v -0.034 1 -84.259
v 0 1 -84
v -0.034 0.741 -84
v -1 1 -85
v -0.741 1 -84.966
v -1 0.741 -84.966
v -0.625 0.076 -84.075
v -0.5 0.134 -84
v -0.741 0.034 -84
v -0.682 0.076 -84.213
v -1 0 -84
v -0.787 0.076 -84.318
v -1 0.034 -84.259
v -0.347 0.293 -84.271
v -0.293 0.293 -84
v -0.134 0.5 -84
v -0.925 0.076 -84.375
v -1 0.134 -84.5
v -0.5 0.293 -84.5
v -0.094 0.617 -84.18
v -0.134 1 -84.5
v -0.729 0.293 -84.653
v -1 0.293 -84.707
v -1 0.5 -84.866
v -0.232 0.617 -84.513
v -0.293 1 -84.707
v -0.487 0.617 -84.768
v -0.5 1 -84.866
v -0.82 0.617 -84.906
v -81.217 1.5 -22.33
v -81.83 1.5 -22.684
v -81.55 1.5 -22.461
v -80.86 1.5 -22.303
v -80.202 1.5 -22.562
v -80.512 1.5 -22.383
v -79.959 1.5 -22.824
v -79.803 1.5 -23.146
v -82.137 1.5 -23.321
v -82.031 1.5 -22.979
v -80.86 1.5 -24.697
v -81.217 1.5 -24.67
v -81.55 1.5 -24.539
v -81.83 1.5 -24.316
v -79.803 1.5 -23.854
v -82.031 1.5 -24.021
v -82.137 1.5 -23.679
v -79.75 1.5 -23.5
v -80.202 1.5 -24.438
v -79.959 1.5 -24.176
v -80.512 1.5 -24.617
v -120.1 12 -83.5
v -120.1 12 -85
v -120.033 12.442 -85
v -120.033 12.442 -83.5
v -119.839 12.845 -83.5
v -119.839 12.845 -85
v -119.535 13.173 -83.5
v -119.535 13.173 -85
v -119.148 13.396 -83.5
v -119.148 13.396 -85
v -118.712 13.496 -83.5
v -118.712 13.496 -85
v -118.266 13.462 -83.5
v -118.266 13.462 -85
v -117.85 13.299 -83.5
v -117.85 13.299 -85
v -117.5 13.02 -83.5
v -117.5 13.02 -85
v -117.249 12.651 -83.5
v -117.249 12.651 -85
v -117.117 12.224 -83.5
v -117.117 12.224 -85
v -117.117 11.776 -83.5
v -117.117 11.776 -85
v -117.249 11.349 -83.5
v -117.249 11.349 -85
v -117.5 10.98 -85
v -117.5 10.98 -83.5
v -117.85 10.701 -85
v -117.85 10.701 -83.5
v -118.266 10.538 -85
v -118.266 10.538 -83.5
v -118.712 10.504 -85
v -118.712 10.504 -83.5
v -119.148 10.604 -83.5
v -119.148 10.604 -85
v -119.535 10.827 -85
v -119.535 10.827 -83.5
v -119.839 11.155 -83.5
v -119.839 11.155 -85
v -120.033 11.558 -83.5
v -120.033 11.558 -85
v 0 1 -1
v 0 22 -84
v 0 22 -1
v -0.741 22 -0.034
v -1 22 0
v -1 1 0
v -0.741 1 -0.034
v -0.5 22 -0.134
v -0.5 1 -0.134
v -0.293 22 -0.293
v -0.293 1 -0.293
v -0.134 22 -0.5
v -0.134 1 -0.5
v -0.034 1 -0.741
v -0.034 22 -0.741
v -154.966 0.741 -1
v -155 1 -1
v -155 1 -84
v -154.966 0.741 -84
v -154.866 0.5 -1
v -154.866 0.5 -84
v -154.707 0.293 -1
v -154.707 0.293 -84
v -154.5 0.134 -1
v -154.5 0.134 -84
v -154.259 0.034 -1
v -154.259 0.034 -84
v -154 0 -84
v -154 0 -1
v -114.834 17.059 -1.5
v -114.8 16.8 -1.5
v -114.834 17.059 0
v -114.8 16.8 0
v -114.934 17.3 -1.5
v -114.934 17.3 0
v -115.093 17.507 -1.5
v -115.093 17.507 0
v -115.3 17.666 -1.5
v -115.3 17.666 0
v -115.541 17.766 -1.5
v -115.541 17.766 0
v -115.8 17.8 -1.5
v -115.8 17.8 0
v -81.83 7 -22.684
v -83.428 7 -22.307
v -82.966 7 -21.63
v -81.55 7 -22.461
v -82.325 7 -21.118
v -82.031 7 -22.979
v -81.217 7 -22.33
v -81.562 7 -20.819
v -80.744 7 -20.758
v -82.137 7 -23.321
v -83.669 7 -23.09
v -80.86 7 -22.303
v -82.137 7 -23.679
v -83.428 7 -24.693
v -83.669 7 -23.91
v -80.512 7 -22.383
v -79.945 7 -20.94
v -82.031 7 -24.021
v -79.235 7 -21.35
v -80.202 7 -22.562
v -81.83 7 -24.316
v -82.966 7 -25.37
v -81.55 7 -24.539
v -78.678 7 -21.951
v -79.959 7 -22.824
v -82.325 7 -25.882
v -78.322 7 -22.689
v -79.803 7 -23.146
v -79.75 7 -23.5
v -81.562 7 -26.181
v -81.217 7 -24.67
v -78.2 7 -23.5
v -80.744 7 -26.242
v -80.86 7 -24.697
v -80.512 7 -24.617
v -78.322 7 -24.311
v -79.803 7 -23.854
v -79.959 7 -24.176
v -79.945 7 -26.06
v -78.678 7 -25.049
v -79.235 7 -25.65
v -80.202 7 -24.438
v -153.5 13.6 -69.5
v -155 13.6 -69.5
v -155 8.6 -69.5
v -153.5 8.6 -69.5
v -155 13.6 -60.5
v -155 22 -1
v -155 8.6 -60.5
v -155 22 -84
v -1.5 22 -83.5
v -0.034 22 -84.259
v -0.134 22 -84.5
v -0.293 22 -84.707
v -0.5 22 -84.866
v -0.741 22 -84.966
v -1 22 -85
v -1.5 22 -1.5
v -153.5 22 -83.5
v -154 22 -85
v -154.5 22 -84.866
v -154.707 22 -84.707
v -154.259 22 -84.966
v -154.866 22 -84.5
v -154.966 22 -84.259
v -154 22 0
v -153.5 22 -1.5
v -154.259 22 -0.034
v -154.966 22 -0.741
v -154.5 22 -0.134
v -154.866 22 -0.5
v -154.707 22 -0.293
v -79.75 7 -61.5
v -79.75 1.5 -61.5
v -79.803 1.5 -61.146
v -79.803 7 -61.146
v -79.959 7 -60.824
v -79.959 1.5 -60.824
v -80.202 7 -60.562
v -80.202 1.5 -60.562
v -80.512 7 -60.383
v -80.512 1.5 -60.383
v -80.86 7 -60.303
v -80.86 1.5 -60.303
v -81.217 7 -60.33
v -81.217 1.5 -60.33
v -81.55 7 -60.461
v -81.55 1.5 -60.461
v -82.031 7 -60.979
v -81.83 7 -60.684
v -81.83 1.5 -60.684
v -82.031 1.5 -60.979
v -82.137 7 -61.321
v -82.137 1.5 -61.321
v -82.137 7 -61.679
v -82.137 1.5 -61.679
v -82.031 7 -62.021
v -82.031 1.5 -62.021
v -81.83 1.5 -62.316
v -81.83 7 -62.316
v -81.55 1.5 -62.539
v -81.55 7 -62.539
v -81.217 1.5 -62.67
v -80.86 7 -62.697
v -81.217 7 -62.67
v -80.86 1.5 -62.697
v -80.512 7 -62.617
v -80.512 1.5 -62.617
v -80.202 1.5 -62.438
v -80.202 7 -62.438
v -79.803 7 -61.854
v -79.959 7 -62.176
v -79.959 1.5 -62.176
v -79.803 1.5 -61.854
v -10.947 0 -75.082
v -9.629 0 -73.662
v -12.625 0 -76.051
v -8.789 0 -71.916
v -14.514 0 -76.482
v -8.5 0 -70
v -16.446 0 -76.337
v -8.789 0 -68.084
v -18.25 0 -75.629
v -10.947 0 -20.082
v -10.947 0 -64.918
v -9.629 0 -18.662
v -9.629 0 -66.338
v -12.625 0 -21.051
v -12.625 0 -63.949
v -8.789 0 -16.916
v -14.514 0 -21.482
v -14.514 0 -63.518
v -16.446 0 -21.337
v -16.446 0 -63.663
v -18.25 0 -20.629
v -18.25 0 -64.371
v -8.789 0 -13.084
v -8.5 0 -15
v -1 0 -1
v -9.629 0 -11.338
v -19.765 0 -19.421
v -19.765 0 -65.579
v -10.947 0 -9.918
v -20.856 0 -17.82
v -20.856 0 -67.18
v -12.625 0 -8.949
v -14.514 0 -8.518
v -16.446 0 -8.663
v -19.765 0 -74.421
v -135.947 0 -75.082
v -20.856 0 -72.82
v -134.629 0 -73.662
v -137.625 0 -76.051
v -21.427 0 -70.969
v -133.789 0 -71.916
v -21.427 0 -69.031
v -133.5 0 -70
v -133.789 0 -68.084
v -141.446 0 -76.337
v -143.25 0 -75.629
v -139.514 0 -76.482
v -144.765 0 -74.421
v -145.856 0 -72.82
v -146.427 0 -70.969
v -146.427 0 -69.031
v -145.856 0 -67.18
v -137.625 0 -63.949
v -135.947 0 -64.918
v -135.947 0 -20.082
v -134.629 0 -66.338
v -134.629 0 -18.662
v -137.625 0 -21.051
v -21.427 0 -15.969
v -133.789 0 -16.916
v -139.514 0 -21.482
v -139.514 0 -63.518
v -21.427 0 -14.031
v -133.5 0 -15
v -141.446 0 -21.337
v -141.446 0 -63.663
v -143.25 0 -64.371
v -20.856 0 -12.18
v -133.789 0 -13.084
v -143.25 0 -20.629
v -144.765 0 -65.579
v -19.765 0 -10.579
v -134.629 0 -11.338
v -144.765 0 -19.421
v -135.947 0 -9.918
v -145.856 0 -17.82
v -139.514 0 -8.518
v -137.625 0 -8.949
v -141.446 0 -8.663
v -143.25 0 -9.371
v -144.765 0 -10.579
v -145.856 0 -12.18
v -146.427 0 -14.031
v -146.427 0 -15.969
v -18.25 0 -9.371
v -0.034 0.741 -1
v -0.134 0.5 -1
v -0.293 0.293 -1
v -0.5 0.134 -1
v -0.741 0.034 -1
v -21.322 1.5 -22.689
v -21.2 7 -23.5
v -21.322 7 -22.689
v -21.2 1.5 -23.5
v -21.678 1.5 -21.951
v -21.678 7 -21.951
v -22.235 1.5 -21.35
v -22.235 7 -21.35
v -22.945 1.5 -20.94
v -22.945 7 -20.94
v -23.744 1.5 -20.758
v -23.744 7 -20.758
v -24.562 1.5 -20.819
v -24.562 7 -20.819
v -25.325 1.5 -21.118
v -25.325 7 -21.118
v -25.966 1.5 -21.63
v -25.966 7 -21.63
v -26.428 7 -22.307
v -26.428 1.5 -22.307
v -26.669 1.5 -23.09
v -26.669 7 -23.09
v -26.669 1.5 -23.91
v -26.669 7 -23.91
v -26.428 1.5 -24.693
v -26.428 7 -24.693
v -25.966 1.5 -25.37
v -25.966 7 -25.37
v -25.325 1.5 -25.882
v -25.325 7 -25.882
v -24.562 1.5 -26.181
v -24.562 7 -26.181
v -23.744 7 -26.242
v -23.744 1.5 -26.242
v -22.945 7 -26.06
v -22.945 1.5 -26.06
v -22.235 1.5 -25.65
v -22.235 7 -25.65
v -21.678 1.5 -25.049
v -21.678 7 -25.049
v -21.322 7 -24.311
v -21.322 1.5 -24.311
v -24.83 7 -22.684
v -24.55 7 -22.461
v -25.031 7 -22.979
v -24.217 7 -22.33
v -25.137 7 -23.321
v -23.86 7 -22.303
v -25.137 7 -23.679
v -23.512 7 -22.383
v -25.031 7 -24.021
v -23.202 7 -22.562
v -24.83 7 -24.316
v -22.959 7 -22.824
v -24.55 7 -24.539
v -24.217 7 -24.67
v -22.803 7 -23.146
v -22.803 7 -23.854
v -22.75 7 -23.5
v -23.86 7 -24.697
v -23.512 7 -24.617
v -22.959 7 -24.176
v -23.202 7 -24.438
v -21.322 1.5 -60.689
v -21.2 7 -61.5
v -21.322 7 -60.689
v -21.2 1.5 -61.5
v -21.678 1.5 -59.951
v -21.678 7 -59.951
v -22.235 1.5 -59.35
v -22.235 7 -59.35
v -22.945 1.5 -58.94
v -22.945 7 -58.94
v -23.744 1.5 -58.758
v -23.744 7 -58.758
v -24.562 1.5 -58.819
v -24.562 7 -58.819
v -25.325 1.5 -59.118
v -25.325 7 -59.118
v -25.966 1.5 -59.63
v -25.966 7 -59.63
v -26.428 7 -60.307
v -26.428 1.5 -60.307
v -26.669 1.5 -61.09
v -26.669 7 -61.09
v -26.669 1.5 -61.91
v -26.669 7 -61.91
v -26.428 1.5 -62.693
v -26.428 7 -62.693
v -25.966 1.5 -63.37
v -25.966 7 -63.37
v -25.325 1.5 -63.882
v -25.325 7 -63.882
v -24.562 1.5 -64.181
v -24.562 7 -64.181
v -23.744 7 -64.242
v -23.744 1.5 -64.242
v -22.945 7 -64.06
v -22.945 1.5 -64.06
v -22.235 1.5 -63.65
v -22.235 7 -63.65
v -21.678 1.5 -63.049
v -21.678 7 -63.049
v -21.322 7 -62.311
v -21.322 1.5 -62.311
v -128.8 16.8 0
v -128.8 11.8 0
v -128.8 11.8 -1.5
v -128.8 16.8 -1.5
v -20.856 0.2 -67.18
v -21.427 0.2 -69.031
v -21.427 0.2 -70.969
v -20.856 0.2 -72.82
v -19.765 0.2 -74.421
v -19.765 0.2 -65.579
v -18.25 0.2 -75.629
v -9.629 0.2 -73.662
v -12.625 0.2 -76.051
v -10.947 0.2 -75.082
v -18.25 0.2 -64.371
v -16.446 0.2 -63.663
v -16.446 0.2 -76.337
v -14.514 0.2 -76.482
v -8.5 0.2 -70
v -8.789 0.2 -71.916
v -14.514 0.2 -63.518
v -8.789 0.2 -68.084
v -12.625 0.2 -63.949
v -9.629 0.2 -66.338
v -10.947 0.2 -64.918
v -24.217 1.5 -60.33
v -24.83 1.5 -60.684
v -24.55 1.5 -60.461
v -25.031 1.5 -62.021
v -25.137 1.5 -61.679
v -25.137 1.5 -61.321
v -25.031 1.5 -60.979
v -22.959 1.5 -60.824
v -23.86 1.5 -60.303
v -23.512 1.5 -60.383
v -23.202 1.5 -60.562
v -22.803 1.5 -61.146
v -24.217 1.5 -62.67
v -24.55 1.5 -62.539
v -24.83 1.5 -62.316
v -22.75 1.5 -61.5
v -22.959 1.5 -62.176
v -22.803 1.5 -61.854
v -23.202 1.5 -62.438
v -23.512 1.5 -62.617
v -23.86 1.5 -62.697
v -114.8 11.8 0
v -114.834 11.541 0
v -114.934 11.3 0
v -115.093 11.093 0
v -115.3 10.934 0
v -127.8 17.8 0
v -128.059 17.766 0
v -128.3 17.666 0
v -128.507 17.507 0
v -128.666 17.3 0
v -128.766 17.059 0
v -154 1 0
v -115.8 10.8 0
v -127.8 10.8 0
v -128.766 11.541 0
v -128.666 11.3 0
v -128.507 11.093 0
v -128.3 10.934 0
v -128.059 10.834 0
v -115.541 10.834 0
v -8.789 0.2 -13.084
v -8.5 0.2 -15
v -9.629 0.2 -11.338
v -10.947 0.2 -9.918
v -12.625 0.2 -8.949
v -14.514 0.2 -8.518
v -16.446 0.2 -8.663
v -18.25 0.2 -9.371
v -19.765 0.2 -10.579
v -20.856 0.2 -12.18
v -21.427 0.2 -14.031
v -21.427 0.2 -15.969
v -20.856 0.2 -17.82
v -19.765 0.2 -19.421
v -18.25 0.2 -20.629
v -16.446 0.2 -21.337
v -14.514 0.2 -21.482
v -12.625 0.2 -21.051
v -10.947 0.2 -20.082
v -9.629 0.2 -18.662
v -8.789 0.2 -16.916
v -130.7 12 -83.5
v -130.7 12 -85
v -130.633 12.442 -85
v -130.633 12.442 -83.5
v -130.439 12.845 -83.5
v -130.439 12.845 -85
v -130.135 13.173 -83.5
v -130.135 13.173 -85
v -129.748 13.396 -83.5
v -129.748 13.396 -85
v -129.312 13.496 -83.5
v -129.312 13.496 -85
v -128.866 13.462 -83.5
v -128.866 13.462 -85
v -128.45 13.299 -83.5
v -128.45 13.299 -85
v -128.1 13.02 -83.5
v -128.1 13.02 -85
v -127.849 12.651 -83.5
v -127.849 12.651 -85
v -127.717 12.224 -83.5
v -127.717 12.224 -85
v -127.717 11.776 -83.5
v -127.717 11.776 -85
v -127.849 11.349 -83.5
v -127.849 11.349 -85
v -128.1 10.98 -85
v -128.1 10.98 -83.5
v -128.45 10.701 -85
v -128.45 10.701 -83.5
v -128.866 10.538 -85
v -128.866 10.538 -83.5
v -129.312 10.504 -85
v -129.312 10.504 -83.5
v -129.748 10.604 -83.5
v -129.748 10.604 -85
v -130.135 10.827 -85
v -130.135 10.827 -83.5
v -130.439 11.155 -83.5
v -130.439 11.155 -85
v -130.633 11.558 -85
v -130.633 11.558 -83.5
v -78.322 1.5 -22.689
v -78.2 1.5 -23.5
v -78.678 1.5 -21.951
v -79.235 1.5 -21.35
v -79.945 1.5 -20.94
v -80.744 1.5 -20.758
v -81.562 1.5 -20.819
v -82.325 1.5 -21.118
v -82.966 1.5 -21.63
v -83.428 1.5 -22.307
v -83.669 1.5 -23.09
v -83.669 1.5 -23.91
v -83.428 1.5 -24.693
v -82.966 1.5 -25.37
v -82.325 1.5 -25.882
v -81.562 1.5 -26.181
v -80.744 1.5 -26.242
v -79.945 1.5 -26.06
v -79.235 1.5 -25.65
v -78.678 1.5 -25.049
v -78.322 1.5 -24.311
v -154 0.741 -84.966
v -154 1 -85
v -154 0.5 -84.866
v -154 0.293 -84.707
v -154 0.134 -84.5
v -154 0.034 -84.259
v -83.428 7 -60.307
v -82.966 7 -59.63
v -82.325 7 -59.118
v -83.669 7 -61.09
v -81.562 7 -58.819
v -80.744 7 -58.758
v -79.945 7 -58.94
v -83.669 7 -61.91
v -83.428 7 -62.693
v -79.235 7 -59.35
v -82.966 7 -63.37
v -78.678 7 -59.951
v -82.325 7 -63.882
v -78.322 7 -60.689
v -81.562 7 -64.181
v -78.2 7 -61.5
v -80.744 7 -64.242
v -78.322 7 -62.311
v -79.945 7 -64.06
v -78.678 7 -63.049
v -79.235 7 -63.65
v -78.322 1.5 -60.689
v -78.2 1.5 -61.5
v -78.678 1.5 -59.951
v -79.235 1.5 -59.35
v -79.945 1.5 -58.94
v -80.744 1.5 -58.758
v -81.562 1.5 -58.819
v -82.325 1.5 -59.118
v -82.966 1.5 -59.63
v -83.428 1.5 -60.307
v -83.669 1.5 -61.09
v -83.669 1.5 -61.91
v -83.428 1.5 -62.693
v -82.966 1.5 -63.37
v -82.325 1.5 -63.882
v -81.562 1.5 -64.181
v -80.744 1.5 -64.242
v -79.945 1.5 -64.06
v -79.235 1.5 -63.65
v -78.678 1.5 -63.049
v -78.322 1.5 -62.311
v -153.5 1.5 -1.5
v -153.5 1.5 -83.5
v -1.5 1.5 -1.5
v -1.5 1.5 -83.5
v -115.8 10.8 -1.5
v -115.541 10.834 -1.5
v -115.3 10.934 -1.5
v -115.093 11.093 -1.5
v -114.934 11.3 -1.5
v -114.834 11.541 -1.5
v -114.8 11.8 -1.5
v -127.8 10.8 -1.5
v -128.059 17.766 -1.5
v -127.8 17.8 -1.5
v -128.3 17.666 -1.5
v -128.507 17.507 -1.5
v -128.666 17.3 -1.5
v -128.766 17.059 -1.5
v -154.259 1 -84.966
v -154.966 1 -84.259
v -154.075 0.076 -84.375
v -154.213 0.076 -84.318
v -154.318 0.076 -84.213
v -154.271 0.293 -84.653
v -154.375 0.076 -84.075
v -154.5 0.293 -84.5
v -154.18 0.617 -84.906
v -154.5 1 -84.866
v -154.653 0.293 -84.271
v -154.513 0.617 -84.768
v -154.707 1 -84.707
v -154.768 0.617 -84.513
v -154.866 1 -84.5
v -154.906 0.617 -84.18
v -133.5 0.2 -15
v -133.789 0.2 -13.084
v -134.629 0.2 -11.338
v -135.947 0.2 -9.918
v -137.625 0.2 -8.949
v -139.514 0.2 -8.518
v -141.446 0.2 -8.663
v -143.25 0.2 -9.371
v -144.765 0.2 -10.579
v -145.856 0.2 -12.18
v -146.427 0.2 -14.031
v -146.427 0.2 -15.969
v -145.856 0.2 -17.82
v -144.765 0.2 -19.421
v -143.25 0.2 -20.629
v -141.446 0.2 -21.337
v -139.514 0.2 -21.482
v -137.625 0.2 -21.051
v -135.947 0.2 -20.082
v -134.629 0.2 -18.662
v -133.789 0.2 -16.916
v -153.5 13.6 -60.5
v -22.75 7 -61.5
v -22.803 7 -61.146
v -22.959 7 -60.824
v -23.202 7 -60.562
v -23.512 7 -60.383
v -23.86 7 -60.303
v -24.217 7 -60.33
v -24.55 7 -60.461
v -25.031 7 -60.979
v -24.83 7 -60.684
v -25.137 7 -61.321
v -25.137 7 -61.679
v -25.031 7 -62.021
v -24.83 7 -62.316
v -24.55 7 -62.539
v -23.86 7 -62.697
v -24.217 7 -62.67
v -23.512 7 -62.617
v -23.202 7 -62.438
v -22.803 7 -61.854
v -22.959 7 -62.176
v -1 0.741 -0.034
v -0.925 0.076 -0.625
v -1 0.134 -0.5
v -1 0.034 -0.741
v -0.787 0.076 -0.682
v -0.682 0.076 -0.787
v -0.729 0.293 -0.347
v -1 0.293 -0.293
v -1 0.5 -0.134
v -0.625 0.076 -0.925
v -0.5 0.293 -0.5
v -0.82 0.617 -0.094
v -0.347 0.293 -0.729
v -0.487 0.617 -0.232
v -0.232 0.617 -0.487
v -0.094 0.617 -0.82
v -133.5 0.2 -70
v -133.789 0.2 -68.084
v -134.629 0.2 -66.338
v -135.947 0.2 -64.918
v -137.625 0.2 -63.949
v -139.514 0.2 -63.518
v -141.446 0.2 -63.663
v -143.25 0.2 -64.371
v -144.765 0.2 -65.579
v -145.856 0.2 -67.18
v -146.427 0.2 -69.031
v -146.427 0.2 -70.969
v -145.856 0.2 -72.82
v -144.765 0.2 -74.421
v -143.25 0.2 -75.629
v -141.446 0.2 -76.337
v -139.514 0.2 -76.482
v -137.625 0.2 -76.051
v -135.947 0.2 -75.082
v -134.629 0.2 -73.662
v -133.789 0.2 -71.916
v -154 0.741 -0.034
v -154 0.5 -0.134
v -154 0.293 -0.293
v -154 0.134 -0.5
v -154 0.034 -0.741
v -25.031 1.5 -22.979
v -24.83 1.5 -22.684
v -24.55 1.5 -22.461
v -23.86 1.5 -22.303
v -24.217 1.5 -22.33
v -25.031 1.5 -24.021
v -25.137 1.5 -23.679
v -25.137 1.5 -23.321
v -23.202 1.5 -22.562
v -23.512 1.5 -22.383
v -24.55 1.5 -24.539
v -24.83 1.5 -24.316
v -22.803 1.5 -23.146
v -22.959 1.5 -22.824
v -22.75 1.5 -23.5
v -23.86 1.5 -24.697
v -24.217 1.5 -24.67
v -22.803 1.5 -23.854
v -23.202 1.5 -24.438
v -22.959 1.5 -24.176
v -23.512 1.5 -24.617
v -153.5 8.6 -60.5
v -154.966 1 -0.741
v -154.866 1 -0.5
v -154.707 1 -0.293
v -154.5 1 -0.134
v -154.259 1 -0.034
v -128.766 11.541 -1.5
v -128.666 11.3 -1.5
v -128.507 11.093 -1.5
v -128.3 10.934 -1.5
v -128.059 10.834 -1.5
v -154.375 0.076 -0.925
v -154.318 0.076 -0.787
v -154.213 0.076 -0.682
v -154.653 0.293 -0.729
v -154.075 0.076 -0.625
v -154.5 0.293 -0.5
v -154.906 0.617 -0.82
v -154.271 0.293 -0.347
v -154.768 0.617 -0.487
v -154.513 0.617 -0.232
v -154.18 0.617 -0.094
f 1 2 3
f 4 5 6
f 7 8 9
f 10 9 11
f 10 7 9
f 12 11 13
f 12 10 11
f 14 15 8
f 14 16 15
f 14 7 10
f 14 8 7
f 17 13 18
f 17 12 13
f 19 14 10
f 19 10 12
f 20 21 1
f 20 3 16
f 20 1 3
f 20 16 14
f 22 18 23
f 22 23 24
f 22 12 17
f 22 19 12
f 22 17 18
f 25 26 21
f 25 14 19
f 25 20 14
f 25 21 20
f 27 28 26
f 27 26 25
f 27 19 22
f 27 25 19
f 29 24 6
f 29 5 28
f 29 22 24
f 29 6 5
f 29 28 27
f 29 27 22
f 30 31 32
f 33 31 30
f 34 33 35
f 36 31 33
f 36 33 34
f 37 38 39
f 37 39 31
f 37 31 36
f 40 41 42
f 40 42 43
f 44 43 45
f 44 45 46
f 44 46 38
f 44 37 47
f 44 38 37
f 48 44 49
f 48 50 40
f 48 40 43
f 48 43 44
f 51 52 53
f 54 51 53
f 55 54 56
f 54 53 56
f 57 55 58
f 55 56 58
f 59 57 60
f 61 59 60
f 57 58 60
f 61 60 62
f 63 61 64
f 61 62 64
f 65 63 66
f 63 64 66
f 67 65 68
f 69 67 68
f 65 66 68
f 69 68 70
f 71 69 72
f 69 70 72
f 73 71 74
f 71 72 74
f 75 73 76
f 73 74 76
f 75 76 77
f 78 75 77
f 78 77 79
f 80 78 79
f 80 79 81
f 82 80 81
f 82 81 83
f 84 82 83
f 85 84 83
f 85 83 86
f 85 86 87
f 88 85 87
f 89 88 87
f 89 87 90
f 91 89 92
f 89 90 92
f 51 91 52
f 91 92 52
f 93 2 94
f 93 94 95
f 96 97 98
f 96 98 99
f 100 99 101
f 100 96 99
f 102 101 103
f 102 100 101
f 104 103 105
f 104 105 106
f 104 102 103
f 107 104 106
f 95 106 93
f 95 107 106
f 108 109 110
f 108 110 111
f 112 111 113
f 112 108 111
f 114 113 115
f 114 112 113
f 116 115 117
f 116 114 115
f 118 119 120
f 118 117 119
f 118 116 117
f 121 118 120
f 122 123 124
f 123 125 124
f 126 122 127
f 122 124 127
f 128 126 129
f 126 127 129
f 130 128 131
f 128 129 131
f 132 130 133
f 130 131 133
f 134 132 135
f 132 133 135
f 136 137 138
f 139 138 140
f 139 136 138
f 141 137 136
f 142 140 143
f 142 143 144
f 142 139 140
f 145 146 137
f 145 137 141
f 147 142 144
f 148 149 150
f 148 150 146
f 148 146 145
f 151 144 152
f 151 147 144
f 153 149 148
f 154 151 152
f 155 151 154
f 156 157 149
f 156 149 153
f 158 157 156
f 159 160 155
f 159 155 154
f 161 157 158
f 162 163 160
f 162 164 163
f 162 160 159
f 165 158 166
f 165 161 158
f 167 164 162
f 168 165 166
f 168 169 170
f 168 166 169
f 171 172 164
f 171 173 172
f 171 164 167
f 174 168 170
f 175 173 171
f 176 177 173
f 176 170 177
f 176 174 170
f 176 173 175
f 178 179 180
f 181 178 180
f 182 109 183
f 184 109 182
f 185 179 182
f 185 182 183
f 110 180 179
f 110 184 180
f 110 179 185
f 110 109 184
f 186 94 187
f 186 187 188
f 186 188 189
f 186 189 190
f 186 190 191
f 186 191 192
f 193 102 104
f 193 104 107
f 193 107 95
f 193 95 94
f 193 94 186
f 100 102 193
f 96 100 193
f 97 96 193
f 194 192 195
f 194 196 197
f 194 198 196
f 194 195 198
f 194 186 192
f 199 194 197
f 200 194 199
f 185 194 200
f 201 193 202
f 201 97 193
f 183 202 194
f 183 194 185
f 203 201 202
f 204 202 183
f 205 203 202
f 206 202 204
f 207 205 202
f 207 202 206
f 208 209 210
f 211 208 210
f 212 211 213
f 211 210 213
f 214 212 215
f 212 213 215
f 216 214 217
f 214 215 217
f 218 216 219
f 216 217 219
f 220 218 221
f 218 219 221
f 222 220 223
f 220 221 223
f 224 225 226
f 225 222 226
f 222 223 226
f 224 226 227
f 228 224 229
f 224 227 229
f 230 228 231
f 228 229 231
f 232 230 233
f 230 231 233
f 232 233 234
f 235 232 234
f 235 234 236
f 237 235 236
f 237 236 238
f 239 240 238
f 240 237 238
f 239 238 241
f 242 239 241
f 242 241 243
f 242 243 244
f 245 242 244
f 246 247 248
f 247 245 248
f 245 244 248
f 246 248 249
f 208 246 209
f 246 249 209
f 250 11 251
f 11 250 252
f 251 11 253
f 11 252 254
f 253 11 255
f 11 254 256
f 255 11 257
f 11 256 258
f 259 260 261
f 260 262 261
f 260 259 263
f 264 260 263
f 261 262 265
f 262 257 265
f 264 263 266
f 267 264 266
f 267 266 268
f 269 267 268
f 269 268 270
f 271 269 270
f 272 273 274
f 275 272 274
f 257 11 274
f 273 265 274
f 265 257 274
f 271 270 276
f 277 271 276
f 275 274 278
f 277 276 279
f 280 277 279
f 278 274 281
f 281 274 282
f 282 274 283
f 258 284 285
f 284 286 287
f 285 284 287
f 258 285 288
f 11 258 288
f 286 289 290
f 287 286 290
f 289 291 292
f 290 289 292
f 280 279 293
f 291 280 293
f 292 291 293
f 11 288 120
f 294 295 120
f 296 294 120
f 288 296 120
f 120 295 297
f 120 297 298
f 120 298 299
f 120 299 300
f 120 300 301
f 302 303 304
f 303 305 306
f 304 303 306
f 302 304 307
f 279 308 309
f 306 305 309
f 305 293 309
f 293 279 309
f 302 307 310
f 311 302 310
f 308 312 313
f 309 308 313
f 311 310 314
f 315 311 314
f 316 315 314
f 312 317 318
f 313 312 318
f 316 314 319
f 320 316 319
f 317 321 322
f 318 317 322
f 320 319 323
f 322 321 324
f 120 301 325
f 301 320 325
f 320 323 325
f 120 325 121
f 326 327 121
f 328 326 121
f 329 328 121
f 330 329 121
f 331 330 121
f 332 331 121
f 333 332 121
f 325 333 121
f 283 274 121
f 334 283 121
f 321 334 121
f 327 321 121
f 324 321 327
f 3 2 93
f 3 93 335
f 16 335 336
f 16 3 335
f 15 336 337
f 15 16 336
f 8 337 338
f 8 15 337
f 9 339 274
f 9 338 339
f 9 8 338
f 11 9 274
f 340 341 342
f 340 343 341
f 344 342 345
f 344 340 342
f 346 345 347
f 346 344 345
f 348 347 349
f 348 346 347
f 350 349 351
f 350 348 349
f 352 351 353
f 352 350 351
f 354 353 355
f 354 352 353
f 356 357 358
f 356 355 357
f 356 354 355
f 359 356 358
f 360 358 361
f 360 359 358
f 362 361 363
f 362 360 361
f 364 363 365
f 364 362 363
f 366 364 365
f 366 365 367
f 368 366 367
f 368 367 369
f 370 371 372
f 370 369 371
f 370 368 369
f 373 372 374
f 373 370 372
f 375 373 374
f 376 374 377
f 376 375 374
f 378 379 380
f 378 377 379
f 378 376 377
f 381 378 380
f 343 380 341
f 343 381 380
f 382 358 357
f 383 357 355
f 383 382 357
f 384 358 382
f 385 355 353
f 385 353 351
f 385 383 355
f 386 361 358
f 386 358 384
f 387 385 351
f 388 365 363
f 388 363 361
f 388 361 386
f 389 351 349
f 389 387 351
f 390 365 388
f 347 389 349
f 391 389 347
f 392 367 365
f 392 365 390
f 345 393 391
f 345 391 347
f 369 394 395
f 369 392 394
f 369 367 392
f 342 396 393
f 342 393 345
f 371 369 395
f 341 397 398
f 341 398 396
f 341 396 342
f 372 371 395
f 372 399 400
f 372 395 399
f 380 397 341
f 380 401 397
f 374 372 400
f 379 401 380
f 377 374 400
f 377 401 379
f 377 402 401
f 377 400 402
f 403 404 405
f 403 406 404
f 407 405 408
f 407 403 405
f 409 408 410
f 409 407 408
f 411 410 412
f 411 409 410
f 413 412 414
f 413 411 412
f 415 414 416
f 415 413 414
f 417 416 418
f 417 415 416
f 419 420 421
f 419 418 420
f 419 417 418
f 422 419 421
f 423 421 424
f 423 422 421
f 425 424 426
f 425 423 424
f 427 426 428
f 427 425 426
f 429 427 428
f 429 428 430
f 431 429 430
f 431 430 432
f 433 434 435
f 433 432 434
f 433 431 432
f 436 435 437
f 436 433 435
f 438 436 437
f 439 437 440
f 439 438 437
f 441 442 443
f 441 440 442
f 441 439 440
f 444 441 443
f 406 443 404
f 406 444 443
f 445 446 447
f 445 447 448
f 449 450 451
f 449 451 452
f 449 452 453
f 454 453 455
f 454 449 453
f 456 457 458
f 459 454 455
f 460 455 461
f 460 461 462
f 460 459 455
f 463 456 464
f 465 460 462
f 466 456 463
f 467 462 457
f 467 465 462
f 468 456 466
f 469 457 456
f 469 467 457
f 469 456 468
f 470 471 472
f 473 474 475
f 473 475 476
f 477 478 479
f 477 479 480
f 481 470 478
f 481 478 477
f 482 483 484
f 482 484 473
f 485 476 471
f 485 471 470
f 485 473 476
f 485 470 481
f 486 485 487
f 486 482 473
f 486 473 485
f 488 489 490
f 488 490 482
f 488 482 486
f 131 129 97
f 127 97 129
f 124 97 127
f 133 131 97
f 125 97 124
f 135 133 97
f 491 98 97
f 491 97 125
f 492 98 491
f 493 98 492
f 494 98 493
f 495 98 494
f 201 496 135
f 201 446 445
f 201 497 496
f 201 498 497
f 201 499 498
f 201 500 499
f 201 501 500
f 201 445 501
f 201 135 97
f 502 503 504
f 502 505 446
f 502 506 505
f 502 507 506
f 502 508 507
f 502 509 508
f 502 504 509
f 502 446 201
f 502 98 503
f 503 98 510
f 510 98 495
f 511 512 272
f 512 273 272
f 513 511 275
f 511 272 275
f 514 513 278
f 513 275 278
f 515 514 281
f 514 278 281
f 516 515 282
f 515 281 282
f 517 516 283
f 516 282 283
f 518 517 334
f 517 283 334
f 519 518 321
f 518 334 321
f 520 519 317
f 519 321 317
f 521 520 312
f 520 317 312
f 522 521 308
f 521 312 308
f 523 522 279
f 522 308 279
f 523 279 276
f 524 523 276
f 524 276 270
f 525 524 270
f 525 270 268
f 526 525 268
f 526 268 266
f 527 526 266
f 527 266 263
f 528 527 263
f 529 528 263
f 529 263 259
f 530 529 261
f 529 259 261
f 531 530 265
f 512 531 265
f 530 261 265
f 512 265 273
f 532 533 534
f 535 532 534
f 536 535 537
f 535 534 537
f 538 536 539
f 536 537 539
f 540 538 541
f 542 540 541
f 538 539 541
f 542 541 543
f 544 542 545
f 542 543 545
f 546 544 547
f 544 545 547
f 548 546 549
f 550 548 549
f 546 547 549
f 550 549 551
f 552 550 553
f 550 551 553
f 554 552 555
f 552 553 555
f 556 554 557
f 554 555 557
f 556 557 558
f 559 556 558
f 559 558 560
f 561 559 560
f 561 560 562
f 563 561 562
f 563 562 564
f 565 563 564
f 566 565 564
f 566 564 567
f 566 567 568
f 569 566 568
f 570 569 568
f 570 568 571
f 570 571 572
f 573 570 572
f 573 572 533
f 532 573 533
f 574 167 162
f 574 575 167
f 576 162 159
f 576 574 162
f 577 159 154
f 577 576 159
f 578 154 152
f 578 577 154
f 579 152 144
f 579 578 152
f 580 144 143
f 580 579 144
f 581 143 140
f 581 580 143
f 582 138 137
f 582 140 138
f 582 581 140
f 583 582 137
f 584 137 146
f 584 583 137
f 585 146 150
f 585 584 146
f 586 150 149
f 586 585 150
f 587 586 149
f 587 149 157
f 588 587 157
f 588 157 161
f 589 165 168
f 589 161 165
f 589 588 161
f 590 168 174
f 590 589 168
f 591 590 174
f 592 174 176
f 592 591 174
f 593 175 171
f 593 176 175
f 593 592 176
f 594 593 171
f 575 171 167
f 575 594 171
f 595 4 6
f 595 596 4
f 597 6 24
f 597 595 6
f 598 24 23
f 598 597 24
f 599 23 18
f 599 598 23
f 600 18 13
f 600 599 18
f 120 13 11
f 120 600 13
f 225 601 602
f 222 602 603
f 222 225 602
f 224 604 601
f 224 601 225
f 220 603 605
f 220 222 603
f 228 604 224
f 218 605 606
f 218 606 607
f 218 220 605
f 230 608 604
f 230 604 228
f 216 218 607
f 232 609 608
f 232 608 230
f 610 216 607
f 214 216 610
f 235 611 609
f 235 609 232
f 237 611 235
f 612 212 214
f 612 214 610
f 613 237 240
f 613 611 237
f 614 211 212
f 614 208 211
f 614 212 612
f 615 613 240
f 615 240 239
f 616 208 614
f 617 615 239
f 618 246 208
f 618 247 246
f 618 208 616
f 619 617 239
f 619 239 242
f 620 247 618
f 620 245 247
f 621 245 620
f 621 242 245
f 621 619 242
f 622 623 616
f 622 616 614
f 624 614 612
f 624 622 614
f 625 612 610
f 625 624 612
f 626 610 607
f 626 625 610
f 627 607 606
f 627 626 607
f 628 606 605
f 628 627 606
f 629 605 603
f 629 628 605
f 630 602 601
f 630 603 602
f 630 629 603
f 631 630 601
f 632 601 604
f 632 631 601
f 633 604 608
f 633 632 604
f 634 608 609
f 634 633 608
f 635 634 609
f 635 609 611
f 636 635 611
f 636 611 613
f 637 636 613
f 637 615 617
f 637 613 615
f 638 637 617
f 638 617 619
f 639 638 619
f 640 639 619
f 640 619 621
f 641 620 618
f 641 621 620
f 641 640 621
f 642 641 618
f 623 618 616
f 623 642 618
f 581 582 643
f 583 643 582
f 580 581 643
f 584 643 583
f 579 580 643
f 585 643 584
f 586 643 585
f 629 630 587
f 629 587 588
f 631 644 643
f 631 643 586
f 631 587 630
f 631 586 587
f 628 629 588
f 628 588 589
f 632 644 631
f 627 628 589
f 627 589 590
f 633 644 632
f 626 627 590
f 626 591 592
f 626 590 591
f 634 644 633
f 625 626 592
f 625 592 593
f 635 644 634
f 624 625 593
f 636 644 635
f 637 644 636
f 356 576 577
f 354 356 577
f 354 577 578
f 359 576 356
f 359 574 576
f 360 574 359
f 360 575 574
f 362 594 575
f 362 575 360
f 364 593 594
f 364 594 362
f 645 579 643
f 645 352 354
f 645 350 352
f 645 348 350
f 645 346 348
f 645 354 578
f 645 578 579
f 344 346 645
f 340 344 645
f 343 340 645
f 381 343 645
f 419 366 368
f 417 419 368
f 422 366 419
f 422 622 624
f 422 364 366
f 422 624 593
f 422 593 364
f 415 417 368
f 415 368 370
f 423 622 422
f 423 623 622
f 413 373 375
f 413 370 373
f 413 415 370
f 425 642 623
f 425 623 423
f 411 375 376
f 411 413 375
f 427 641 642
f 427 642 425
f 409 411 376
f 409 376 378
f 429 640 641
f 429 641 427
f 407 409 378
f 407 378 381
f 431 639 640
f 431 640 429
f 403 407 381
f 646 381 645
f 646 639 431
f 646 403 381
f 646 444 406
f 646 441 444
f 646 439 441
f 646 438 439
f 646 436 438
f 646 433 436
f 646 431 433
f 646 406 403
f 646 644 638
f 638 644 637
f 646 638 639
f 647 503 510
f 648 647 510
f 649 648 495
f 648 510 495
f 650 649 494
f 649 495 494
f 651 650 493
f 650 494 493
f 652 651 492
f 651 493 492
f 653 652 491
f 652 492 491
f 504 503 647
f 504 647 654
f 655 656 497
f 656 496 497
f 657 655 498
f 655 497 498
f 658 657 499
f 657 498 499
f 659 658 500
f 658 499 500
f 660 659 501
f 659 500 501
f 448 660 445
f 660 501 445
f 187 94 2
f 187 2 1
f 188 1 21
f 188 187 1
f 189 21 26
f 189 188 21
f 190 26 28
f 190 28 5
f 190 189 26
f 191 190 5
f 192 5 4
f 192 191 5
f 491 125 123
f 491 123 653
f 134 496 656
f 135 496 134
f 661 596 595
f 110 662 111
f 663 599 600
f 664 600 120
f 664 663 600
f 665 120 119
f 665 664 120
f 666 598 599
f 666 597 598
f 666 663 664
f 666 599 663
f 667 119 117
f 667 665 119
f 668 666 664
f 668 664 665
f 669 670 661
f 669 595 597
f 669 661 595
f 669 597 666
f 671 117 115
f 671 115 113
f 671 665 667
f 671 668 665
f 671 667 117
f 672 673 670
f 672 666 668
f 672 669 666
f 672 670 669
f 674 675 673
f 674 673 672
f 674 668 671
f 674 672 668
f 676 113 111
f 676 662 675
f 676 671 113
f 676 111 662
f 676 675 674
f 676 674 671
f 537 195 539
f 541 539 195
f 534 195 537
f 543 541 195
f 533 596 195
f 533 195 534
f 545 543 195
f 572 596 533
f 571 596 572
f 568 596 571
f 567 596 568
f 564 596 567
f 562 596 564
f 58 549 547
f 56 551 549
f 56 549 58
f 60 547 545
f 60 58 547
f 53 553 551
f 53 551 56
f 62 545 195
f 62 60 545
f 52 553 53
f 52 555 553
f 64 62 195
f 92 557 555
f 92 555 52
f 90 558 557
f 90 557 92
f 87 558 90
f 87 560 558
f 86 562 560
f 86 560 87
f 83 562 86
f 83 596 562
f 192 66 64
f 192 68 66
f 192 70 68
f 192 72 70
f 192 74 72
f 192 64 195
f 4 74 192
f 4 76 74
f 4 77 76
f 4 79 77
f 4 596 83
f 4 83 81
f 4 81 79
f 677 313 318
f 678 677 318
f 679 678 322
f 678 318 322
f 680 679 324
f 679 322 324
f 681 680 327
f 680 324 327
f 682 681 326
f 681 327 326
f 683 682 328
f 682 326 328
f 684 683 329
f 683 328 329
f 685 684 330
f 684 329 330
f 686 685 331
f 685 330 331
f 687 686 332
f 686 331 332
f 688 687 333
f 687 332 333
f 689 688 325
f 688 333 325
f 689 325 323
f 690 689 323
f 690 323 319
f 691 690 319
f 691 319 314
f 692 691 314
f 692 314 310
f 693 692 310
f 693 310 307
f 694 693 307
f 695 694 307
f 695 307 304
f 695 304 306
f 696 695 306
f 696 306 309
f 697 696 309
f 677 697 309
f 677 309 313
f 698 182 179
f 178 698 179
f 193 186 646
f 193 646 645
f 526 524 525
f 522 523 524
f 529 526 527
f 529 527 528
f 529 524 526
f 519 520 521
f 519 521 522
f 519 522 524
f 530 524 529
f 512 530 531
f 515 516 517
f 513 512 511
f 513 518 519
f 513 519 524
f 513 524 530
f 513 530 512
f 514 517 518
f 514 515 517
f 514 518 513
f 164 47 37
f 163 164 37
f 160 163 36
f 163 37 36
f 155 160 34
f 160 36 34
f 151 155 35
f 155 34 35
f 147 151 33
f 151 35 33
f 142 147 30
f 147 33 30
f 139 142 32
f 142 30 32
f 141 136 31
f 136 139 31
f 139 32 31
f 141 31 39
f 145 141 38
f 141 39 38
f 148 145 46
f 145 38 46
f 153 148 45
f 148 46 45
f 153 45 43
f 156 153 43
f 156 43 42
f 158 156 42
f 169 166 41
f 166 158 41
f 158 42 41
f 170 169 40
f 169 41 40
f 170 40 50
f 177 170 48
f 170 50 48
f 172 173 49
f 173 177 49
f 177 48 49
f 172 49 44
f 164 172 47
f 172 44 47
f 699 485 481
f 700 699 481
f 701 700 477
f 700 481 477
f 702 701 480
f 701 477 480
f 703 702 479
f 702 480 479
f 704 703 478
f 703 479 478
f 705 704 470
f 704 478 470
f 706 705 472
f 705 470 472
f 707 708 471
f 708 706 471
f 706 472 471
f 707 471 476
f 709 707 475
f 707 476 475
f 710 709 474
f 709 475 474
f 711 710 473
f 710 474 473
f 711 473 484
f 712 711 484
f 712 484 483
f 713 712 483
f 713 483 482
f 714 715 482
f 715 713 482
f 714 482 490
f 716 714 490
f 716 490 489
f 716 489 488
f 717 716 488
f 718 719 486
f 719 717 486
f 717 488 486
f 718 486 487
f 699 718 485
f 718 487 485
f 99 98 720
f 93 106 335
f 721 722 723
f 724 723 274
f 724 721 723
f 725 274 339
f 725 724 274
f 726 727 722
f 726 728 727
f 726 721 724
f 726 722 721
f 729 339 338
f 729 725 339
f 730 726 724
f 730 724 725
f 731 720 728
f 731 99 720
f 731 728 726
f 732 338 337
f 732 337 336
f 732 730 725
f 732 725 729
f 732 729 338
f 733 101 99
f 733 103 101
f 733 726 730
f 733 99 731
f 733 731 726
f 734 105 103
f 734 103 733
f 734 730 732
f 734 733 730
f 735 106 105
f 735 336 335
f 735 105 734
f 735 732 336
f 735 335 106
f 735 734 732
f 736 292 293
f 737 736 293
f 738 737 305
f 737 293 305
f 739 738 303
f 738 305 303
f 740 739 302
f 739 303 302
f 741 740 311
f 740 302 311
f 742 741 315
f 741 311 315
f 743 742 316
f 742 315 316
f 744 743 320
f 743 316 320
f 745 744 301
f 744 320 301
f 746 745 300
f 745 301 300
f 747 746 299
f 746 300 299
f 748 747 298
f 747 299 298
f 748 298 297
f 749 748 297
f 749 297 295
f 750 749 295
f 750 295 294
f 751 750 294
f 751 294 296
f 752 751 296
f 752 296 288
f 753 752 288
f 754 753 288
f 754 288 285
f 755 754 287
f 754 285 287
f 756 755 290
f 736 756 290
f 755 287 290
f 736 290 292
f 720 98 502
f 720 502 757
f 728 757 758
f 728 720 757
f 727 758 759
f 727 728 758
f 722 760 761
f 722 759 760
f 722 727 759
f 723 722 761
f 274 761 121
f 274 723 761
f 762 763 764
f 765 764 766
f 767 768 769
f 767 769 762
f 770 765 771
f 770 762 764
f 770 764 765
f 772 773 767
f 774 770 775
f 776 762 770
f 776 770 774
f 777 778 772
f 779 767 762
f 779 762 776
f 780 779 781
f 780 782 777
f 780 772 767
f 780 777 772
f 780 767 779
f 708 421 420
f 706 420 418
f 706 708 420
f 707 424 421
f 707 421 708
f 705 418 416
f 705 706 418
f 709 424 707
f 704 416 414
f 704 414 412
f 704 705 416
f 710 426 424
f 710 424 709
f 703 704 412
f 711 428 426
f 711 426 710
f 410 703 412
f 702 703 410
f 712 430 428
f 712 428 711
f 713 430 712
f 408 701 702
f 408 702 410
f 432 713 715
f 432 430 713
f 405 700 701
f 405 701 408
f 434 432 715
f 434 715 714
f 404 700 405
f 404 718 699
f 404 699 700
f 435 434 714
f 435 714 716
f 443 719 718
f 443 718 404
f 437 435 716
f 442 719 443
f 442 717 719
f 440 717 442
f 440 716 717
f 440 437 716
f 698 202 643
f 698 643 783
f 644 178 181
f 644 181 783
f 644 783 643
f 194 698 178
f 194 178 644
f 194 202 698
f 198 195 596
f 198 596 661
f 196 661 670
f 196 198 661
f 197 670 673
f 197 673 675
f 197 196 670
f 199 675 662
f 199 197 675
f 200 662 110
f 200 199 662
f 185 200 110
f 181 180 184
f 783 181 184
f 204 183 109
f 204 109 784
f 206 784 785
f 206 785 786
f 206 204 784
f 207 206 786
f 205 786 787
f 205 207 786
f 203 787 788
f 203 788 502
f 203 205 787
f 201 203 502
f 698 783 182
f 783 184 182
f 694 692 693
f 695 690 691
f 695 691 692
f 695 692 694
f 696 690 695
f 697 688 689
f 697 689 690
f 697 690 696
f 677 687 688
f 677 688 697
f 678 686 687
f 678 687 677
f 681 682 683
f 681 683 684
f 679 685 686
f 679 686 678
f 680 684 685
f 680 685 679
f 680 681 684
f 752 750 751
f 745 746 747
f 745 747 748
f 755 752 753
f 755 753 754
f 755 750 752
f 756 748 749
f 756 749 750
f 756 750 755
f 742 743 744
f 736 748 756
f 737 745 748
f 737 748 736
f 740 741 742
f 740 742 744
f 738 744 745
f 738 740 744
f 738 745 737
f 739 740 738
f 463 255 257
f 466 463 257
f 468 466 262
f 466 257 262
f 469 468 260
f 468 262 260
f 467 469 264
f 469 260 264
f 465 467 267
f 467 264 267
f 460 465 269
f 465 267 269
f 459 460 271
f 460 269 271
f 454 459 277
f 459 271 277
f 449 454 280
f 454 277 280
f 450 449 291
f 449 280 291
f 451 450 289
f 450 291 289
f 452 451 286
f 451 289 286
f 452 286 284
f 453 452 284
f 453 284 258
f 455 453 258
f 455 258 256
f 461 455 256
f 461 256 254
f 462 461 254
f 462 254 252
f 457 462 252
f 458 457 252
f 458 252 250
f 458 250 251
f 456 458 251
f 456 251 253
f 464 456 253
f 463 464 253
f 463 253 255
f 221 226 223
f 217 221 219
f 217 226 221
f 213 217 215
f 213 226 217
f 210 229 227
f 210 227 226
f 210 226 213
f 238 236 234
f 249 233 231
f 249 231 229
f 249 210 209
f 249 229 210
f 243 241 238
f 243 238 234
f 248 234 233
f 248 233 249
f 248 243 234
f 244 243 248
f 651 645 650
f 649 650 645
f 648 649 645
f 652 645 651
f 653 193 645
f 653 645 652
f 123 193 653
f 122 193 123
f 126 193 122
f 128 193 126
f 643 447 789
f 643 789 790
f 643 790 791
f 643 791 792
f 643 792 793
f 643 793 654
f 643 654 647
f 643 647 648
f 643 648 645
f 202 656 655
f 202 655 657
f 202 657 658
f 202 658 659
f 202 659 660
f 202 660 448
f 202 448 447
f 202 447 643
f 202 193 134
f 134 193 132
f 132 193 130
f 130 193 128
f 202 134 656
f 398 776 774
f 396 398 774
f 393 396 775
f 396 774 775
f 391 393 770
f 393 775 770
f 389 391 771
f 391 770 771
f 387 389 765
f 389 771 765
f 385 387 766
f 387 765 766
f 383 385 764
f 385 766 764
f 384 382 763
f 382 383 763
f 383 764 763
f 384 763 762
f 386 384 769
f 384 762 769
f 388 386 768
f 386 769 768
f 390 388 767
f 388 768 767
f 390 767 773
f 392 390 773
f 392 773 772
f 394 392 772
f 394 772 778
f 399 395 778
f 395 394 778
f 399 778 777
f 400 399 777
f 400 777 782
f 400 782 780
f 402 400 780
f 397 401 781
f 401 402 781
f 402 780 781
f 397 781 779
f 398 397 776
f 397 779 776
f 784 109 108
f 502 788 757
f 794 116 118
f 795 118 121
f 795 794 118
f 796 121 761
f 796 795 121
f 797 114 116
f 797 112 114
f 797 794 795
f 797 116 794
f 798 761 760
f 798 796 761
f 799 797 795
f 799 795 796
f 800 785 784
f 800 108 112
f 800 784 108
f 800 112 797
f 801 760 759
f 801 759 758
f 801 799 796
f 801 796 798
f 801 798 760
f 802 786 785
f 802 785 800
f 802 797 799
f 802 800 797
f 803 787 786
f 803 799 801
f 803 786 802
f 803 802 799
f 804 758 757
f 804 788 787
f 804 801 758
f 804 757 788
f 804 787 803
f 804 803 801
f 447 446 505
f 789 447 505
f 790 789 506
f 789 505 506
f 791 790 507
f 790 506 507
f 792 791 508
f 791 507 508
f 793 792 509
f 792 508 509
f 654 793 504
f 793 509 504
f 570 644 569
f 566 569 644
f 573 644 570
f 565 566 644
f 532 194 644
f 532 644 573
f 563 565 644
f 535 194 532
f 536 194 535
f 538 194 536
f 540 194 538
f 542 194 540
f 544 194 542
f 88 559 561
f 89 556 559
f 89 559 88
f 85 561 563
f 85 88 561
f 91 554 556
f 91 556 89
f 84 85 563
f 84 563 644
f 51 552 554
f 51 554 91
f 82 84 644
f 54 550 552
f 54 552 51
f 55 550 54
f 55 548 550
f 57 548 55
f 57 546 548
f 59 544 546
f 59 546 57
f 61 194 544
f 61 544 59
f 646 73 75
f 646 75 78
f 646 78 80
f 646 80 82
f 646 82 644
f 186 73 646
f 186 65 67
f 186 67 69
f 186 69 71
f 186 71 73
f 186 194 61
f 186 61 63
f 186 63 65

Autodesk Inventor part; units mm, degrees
ref_plane "YZ Plane" through (0, 0, 0) normal (1, 0, 0) x (0, 1, 0)
ref_plane "XZ Plane" through (0, 0, 0) normal (0, 1, 0) x (-1, 0, 0)
ref_plane "XY Plane" through (0, 0, 0) normal (0, 0, 1) x (1, 0, 0)
sketch "Skizze1" plane through (0, 0, 0) normal (0, 1, 0) x (-1, 0, 0)
  line L0 (0, 0) -> (155, 0)
  line L1 (155, 0) -> (155, -85)
  line L2 (155, -85) -> (0, -85)
  line L3 (0, -85) -> (0, 0)
  dimension "d0" = 155
  dimension "d1" = 85
extrude "Extrusion1" add sketch "Skizze1" along normal blind 22
sketch "Skizze2" plane through (0, 22, 0) normal (0, 1, 0) x (1, 0, 0)
  line L0 (-1.5, 1.5) -> (-153.5, 1.5)
  line L1 (-153.5, 1.5) -> (-153.5, 83.5)
  line L2 (-153.5, 83.5) -> (-1.5, 83.5)
  line L3 (-1.5, 83.5) -> (-1.5, 1.5)
  line L4 (-155, 0) -> (0, 0) projected
  line L5 (0, 85) -> (-155, 85) projected
  line L6 (0, 0) -> (0, 85) projected
  line L7 (-155, 85) -> (-155, 0) projected
  dimension "d4" = 1.5
  dimension "d5" = 1.5
  dimension "d6" = 1.5
  dimension "d7" = 1.5
extrude "Extrusion2" cut sketch "Skizze2" against normal blind 20.5 contours L0 L1 L2 L3
sketch "Skizze3" plane through (-155, 0, 0) normal (0, 0, 1) x (1, 0, 0)
  line L0 (27.2, 17.8) -> (39.2, 17.8)
  line L1 (40.2, 16.8) -> (40.2, 11.8)
  line L2 (39.2, 10.8) -> (27.2, 10.8)
  line L3 (26.2, 11.8) -> (26.2, 16.8)
  arc A0 (26.2, 11.8) -> (27.2, 10.8) centre (27.2, 11.8) ccw
  arc A1 (27.2, 17.8) -> (26.2, 16.8) centre (27.2, 16.8) ccw
  arc A2 (40.2, 16.8) -> (39.2, 17.8) centre (39.2, 16.8) ccw
  arc A3 (39.2, 10.8) -> (40.2, 11.8) centre (39.2, 11.8) ccw
  line L4 (153.5, 1.5) -> (1.5, 1.5) projected
  line L5 (1.5, 22) -> (1.5, 1.5) projected
  point P0 (155, 0)
  dimension "d10" = 1
  dimension "d71" = 14
  dimension "d72" = 7
  dimension "d73" = 9.3
  dimension "d74" = 24.7
extrude "Extrusion3" cut sketch "Skizze3" against normal blind 3
sketch "Skizze4" plane through (0, 1.5, 0) normal (0, 1, 0) x (1, 0, 0)
  circle A0 centre (-80.95, 23.5) radius 2.75
  circle A1 centre (-80.95, 61.5) radius 2.75
  circle A2 centre (-23.95, 23.5) radius 2.75
  circle A3 centre (-23.95, 61.5) radius 2.75
  circle A4 centre (-80.95, 23.5) radius 1.2
  circle A5 centre (-80.95, 61.5) radius 1.2
  circle A6 centre (-23.95, 23.5) radius 1.2
  circle A7 centre (-23.95, 61.5) radius 1.2
  line L0 (-1.5, 83.5) -> (-1.5, 1.5) projected
  line L1 (-1.5, 1.5) -> (-153.5, 1.5) projected
  line L2 (-153.5, 83.5) -> (-1.5, 83.5) projected
  point P0 (0, 0)
  dimension "d13" = 5.5
  dimension "d14" = 5.5
  dimension "d15" = 5.5
  dimension "d16" = 5.5
  dimension "d17" = 38
  dimension "d18" = 38
  dimension "d19" = 57
  dimension "d40" = 2.4
  dimension "d41" = 2.4
  dimension "d42" = 2.4
  dimension "d43" = 2.4
  dimension "d44" = 22.45
  dimension "d45" = 22
  dimension "d47" = 22
  dimension "d51" = 22.45
  dimension "d53" = 57
  dimension "d54" = 22
  dimension "d55" = 22
extrude "Extrusion4" add sketch "Skizze4" along normal blind 5.5
sketch "Skizze5" plane through (-155, 0, -85) normal (-1, 0, 0) x (0, 0, 1)
  line L0 (15.5, 8.6) -> (24.5, 8.6)
  line L1 (24.5, 8.6) -> (24.5, 13.6)
  line L2 (24.5, 13.6) -> (15.5, 13.6)
  line L3 (15.5, 13.6) -> (15.5, 8.6)
  line L4 (1.5, 22) -> (1.5, 1.5) projected
  line L5 (83.5, 1.5) -> (1.5, 1.5) projected
  point P0 (85, 0)
  dimension "d59" = 14
  dimension "d60" = 9
  dimension "d61" = 5
  dimension "d62" = 7.1
extrude "Extrusion5" cut sketch "Skizze5" against normal blind 3
fillet "Rundung1" radius 1 4 edges at (0, 11, 0) (0, 11, -85) (-155, 11, 0) (-155, 11, -85)
fillet "Rundung2" radius 1 8 edges at (-0.2929, 0, -0.2929) (0, 0, -42.5) (-0.2929, 0, -84.7071) (-77.5, 0, -85) (-154.7071, 0, -84.7071) (-155, 0, -42.5) (-154.7071, 0, -0.2929) (-77.5, 0, 0)
sketch "Skizze6" plane through (0, 0, 0) normal (0, -1, 0) x (1, 0, 0)
  circle A0 centre (-140, -70) radius 6.5
  circle A1 centre (-140, -15) radius 6.5
  circle A2 centre (-15, -70) radius 6.5
  circle A3 centre (-15, -15) radius 6.5
  line L0 (-1, 0) -> (-154, 0) projected
  line L1 (-154, -85) -> (-1, -85) projected
  line L2 (-155, -1) -> (-155, -84) projected
  line L3 (0, -84) -> (0, -1) projected
  point P0 (0, 0)
  dimension "d26" = 13
  dimension "d27" = 13
  dimension "d28" = 13
  dimension "d29" = 13
  dimension "d63" = 15
  dimension "d64" = 15
  dimension "d65" = 15
  dimension "d66" = 15
  dimension "d67" = 15
  dimension "d68" = 15
  dimension "d69" = 15
  dimension "d70" = 15
extrude "Extrusion6" cut sketch "Skizze6" against normal blind 0.2
sketch "Skizze7" plane through (-1, 22, -85) normal (0, 0, -1) x (-1, 0, 0)
  circle A0 centre (128.2, -10) radius 1.5
  circle A1 centre (117.6, -10) radius 1.5
  line L0 (152.5, -20.5) -> (0.5, -20.5) projected
  line L1 (152.5, 0) -> (152.5, -20.5) projected
  point P0 (-1, -22)
  dimension "d35" = 3
  dimension "d36" = 3
  dimension "d37" = 10.6
  dimension "d56" = 10.5
  dimension "d57" = 10.5
  dimension "d58" = 24.3
extrude "Extrusion7" cut sketch "Skizze7" against normal blind 3
properties part number "Datapad_Case"
